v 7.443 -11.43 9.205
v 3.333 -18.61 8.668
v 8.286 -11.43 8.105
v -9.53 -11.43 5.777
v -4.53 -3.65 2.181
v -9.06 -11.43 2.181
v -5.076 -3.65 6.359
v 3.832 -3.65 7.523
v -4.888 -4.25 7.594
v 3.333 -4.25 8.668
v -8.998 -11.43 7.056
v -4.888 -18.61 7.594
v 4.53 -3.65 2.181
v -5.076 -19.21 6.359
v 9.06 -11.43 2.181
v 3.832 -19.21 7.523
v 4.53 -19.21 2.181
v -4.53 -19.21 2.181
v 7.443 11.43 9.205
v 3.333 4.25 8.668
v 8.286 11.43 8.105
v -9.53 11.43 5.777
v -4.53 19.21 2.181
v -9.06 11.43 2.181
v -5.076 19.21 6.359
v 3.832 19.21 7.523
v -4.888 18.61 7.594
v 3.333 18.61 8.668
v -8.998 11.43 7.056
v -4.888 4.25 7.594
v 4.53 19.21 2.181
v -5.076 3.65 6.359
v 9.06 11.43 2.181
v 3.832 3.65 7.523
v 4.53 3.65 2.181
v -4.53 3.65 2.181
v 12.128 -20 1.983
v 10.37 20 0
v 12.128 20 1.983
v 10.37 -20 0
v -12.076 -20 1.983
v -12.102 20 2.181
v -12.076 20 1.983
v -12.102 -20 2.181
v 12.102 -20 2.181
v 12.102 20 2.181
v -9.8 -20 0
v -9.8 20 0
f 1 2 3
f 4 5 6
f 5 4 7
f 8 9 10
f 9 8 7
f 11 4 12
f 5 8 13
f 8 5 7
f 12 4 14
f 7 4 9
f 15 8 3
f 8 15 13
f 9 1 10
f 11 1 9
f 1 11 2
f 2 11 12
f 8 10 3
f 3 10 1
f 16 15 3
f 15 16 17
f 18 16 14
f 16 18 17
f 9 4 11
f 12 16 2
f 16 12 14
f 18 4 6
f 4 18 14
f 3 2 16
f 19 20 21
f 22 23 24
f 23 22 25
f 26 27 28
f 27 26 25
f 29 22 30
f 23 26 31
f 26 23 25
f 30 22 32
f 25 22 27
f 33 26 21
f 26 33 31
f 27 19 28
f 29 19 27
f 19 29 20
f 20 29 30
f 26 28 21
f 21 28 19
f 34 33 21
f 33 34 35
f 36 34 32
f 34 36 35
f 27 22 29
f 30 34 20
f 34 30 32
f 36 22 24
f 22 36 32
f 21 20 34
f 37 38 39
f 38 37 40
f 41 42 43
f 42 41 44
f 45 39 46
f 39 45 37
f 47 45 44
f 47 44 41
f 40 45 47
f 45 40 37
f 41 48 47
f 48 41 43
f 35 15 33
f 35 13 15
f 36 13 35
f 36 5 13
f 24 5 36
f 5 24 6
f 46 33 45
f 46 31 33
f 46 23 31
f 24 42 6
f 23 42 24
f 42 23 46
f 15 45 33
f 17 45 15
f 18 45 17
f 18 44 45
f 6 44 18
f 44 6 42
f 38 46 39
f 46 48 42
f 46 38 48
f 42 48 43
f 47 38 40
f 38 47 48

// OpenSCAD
// ============================================================================
//  Hex-ramp join clip  —  joins two 228.6 mm hex ramp halves side by side
//
//  The ramp halves ("ramp_half_hex", 57-hole pattern) butt along their
//  228.6 mm edges.  The lattice row nearest that seam is 11.43 mm in on each
//  half and both end rows share the same X columns, so hole centres are
//  22.86 mm apart across the joint.
//
//  Seam-row hole columns are x = -82.80, -43.20 and -3.61.  The plate is only
//  ~3.0 mm thick at x = -82.80, so use the -43.20 or -3.61 column (8.1 /
//  13.4 mm of material).  Two clips per seam.
//
//  The clip drops two hex pegs into the hole pair either side of the seam and
//  bridges the joint with a low, chamfered bar on top.  Peg is a friction/glue
//  fit: `clearance` is the total diametral play.
//
//  Measured reference geometry (ramp_half_hex.stl):
//    hole across flats    15.86 mm  (hexagon vertices point along ramp X)
//    hole depth           through-hole; 8.1 or 13.4 mm at the two usable columns
//    top surface          plane y = 0.130691*x + 13.8003   (7.446 deg)
//    peg span             22.86 mm across the seam
//
//  Print (mode="print"): Z is up, bar top face on the bed, pegs pointing up.
// ============================================================================

// ------------------------------ parameters ---------------------------------
hole_af   = 15.86;      // measured hex hole, across flats
clearance = 0.30;       // total diametral clearance (0.15 per side)
peg_af    = hole_af - clearance;

peg_len   = 6.0;        // peg depth into the hole (plate is 8.2 deep here)
tip_ch    = 0.60;       // lead-in inset per side at the peg tip
tip_h     = 1.20;       // lead-in height

span      = 22.86;      // peg centres either side of the seam
plate_len = 40.0;       // bar length along Z (seam direction)
plate_w   = 24.0;       // bar width along X (slope direction)
plate_t   = 2.2;        // bar thickness above the ramp surface
edge_ch   = 2.0;        // chamfer on the two X edges

slope     = 0.130691;   // ramp top surface slope (7.446 deg)

$fa = 2; $fs = 0.4;

// -------------------------------- modules ----------------------------------
module hex_2d(af) {
    R = af / sqrt(3);
    polygon([for (k = [0:5]) [R * cos(60 * k), R * sin(60 * k)]]);
}

// thin hexagon lying in XZ at height y, extruded +Y
module hex_disc(af, y) {
    translate([0, y, 0]) rotate([-90, 0, 0])
        linear_extrude(height = 0.02) hex_2d(af);
}

// peg: lead-in tip at y = -len, axis +Y.  Runs 2.5 mm up into the bar so the
// union is flush with the bar's sloped underside (no wedge gap at the base).
module hex_peg(af, len, ch, chh) {
    merge = 2.5;
    hull() {
        hex_disc(af - 2 * ch, -len);
        hex_disc(af, -len + chh);
    }
    translate([0, -len + chh, 0]) rotate([-90, 0, 0])
        linear_extrude(height = len - chh + merge) hex_2d(af);
}

module bar() {
    w2 = plate_w / 2;
    c  = min(edge_ch, plate_t - 0.05);
    yb = slope * -w2;
    pts = [
        [-w2,     yb],
        [ w2,     slope * w2],
        [ w2,     slope * w2 + plate_t - c],
        [ w2 - c, slope * (w2 - c) + plate_t],
        [-w2 + c, slope * (-w2 + c) + plate_t],
        [-w2,     yb + plate_t - c],
    ];
    translate([0, 0, -plate_len / 2]) linear_extrude(height = plate_len) polygon(pts);
}

// everything above the plane y = slope*x + off (used to bury the peg tops
// inside the bar, so the union has no exposed peg/base wedge)
module above_surface(off) {
    th = atan(slope);
    rotate([0, 0, th])
        translate([0, off * cos(th), 0])
            translate([-120, 0, -120]) cube([240, 120, 240]);
}

// in-use orientation: bar underside on the ramp surface y = slope*x
module clip_use() {
    bar();
    for (z = [-span / 2, span / 2])
        translate([0, 0, z]) difference() {
            hex_peg(peg_af, peg_len, tip_ch, tip_h);
            above_surface(0.45);
        }
}

// print orientation: Z up, bar top face on the bed, pegs up
module clip_print() {
    th = atan(slope);
    rotate([90, 0, 0])
        translate([0, plate_t * cos(th), 0])
            rotate([0, 0, th]) rotate([180, 0, 0]) clip_use();
}

mode = "print";
if (mode == "print") clip_print();
if (mode == "use") clip_use();
